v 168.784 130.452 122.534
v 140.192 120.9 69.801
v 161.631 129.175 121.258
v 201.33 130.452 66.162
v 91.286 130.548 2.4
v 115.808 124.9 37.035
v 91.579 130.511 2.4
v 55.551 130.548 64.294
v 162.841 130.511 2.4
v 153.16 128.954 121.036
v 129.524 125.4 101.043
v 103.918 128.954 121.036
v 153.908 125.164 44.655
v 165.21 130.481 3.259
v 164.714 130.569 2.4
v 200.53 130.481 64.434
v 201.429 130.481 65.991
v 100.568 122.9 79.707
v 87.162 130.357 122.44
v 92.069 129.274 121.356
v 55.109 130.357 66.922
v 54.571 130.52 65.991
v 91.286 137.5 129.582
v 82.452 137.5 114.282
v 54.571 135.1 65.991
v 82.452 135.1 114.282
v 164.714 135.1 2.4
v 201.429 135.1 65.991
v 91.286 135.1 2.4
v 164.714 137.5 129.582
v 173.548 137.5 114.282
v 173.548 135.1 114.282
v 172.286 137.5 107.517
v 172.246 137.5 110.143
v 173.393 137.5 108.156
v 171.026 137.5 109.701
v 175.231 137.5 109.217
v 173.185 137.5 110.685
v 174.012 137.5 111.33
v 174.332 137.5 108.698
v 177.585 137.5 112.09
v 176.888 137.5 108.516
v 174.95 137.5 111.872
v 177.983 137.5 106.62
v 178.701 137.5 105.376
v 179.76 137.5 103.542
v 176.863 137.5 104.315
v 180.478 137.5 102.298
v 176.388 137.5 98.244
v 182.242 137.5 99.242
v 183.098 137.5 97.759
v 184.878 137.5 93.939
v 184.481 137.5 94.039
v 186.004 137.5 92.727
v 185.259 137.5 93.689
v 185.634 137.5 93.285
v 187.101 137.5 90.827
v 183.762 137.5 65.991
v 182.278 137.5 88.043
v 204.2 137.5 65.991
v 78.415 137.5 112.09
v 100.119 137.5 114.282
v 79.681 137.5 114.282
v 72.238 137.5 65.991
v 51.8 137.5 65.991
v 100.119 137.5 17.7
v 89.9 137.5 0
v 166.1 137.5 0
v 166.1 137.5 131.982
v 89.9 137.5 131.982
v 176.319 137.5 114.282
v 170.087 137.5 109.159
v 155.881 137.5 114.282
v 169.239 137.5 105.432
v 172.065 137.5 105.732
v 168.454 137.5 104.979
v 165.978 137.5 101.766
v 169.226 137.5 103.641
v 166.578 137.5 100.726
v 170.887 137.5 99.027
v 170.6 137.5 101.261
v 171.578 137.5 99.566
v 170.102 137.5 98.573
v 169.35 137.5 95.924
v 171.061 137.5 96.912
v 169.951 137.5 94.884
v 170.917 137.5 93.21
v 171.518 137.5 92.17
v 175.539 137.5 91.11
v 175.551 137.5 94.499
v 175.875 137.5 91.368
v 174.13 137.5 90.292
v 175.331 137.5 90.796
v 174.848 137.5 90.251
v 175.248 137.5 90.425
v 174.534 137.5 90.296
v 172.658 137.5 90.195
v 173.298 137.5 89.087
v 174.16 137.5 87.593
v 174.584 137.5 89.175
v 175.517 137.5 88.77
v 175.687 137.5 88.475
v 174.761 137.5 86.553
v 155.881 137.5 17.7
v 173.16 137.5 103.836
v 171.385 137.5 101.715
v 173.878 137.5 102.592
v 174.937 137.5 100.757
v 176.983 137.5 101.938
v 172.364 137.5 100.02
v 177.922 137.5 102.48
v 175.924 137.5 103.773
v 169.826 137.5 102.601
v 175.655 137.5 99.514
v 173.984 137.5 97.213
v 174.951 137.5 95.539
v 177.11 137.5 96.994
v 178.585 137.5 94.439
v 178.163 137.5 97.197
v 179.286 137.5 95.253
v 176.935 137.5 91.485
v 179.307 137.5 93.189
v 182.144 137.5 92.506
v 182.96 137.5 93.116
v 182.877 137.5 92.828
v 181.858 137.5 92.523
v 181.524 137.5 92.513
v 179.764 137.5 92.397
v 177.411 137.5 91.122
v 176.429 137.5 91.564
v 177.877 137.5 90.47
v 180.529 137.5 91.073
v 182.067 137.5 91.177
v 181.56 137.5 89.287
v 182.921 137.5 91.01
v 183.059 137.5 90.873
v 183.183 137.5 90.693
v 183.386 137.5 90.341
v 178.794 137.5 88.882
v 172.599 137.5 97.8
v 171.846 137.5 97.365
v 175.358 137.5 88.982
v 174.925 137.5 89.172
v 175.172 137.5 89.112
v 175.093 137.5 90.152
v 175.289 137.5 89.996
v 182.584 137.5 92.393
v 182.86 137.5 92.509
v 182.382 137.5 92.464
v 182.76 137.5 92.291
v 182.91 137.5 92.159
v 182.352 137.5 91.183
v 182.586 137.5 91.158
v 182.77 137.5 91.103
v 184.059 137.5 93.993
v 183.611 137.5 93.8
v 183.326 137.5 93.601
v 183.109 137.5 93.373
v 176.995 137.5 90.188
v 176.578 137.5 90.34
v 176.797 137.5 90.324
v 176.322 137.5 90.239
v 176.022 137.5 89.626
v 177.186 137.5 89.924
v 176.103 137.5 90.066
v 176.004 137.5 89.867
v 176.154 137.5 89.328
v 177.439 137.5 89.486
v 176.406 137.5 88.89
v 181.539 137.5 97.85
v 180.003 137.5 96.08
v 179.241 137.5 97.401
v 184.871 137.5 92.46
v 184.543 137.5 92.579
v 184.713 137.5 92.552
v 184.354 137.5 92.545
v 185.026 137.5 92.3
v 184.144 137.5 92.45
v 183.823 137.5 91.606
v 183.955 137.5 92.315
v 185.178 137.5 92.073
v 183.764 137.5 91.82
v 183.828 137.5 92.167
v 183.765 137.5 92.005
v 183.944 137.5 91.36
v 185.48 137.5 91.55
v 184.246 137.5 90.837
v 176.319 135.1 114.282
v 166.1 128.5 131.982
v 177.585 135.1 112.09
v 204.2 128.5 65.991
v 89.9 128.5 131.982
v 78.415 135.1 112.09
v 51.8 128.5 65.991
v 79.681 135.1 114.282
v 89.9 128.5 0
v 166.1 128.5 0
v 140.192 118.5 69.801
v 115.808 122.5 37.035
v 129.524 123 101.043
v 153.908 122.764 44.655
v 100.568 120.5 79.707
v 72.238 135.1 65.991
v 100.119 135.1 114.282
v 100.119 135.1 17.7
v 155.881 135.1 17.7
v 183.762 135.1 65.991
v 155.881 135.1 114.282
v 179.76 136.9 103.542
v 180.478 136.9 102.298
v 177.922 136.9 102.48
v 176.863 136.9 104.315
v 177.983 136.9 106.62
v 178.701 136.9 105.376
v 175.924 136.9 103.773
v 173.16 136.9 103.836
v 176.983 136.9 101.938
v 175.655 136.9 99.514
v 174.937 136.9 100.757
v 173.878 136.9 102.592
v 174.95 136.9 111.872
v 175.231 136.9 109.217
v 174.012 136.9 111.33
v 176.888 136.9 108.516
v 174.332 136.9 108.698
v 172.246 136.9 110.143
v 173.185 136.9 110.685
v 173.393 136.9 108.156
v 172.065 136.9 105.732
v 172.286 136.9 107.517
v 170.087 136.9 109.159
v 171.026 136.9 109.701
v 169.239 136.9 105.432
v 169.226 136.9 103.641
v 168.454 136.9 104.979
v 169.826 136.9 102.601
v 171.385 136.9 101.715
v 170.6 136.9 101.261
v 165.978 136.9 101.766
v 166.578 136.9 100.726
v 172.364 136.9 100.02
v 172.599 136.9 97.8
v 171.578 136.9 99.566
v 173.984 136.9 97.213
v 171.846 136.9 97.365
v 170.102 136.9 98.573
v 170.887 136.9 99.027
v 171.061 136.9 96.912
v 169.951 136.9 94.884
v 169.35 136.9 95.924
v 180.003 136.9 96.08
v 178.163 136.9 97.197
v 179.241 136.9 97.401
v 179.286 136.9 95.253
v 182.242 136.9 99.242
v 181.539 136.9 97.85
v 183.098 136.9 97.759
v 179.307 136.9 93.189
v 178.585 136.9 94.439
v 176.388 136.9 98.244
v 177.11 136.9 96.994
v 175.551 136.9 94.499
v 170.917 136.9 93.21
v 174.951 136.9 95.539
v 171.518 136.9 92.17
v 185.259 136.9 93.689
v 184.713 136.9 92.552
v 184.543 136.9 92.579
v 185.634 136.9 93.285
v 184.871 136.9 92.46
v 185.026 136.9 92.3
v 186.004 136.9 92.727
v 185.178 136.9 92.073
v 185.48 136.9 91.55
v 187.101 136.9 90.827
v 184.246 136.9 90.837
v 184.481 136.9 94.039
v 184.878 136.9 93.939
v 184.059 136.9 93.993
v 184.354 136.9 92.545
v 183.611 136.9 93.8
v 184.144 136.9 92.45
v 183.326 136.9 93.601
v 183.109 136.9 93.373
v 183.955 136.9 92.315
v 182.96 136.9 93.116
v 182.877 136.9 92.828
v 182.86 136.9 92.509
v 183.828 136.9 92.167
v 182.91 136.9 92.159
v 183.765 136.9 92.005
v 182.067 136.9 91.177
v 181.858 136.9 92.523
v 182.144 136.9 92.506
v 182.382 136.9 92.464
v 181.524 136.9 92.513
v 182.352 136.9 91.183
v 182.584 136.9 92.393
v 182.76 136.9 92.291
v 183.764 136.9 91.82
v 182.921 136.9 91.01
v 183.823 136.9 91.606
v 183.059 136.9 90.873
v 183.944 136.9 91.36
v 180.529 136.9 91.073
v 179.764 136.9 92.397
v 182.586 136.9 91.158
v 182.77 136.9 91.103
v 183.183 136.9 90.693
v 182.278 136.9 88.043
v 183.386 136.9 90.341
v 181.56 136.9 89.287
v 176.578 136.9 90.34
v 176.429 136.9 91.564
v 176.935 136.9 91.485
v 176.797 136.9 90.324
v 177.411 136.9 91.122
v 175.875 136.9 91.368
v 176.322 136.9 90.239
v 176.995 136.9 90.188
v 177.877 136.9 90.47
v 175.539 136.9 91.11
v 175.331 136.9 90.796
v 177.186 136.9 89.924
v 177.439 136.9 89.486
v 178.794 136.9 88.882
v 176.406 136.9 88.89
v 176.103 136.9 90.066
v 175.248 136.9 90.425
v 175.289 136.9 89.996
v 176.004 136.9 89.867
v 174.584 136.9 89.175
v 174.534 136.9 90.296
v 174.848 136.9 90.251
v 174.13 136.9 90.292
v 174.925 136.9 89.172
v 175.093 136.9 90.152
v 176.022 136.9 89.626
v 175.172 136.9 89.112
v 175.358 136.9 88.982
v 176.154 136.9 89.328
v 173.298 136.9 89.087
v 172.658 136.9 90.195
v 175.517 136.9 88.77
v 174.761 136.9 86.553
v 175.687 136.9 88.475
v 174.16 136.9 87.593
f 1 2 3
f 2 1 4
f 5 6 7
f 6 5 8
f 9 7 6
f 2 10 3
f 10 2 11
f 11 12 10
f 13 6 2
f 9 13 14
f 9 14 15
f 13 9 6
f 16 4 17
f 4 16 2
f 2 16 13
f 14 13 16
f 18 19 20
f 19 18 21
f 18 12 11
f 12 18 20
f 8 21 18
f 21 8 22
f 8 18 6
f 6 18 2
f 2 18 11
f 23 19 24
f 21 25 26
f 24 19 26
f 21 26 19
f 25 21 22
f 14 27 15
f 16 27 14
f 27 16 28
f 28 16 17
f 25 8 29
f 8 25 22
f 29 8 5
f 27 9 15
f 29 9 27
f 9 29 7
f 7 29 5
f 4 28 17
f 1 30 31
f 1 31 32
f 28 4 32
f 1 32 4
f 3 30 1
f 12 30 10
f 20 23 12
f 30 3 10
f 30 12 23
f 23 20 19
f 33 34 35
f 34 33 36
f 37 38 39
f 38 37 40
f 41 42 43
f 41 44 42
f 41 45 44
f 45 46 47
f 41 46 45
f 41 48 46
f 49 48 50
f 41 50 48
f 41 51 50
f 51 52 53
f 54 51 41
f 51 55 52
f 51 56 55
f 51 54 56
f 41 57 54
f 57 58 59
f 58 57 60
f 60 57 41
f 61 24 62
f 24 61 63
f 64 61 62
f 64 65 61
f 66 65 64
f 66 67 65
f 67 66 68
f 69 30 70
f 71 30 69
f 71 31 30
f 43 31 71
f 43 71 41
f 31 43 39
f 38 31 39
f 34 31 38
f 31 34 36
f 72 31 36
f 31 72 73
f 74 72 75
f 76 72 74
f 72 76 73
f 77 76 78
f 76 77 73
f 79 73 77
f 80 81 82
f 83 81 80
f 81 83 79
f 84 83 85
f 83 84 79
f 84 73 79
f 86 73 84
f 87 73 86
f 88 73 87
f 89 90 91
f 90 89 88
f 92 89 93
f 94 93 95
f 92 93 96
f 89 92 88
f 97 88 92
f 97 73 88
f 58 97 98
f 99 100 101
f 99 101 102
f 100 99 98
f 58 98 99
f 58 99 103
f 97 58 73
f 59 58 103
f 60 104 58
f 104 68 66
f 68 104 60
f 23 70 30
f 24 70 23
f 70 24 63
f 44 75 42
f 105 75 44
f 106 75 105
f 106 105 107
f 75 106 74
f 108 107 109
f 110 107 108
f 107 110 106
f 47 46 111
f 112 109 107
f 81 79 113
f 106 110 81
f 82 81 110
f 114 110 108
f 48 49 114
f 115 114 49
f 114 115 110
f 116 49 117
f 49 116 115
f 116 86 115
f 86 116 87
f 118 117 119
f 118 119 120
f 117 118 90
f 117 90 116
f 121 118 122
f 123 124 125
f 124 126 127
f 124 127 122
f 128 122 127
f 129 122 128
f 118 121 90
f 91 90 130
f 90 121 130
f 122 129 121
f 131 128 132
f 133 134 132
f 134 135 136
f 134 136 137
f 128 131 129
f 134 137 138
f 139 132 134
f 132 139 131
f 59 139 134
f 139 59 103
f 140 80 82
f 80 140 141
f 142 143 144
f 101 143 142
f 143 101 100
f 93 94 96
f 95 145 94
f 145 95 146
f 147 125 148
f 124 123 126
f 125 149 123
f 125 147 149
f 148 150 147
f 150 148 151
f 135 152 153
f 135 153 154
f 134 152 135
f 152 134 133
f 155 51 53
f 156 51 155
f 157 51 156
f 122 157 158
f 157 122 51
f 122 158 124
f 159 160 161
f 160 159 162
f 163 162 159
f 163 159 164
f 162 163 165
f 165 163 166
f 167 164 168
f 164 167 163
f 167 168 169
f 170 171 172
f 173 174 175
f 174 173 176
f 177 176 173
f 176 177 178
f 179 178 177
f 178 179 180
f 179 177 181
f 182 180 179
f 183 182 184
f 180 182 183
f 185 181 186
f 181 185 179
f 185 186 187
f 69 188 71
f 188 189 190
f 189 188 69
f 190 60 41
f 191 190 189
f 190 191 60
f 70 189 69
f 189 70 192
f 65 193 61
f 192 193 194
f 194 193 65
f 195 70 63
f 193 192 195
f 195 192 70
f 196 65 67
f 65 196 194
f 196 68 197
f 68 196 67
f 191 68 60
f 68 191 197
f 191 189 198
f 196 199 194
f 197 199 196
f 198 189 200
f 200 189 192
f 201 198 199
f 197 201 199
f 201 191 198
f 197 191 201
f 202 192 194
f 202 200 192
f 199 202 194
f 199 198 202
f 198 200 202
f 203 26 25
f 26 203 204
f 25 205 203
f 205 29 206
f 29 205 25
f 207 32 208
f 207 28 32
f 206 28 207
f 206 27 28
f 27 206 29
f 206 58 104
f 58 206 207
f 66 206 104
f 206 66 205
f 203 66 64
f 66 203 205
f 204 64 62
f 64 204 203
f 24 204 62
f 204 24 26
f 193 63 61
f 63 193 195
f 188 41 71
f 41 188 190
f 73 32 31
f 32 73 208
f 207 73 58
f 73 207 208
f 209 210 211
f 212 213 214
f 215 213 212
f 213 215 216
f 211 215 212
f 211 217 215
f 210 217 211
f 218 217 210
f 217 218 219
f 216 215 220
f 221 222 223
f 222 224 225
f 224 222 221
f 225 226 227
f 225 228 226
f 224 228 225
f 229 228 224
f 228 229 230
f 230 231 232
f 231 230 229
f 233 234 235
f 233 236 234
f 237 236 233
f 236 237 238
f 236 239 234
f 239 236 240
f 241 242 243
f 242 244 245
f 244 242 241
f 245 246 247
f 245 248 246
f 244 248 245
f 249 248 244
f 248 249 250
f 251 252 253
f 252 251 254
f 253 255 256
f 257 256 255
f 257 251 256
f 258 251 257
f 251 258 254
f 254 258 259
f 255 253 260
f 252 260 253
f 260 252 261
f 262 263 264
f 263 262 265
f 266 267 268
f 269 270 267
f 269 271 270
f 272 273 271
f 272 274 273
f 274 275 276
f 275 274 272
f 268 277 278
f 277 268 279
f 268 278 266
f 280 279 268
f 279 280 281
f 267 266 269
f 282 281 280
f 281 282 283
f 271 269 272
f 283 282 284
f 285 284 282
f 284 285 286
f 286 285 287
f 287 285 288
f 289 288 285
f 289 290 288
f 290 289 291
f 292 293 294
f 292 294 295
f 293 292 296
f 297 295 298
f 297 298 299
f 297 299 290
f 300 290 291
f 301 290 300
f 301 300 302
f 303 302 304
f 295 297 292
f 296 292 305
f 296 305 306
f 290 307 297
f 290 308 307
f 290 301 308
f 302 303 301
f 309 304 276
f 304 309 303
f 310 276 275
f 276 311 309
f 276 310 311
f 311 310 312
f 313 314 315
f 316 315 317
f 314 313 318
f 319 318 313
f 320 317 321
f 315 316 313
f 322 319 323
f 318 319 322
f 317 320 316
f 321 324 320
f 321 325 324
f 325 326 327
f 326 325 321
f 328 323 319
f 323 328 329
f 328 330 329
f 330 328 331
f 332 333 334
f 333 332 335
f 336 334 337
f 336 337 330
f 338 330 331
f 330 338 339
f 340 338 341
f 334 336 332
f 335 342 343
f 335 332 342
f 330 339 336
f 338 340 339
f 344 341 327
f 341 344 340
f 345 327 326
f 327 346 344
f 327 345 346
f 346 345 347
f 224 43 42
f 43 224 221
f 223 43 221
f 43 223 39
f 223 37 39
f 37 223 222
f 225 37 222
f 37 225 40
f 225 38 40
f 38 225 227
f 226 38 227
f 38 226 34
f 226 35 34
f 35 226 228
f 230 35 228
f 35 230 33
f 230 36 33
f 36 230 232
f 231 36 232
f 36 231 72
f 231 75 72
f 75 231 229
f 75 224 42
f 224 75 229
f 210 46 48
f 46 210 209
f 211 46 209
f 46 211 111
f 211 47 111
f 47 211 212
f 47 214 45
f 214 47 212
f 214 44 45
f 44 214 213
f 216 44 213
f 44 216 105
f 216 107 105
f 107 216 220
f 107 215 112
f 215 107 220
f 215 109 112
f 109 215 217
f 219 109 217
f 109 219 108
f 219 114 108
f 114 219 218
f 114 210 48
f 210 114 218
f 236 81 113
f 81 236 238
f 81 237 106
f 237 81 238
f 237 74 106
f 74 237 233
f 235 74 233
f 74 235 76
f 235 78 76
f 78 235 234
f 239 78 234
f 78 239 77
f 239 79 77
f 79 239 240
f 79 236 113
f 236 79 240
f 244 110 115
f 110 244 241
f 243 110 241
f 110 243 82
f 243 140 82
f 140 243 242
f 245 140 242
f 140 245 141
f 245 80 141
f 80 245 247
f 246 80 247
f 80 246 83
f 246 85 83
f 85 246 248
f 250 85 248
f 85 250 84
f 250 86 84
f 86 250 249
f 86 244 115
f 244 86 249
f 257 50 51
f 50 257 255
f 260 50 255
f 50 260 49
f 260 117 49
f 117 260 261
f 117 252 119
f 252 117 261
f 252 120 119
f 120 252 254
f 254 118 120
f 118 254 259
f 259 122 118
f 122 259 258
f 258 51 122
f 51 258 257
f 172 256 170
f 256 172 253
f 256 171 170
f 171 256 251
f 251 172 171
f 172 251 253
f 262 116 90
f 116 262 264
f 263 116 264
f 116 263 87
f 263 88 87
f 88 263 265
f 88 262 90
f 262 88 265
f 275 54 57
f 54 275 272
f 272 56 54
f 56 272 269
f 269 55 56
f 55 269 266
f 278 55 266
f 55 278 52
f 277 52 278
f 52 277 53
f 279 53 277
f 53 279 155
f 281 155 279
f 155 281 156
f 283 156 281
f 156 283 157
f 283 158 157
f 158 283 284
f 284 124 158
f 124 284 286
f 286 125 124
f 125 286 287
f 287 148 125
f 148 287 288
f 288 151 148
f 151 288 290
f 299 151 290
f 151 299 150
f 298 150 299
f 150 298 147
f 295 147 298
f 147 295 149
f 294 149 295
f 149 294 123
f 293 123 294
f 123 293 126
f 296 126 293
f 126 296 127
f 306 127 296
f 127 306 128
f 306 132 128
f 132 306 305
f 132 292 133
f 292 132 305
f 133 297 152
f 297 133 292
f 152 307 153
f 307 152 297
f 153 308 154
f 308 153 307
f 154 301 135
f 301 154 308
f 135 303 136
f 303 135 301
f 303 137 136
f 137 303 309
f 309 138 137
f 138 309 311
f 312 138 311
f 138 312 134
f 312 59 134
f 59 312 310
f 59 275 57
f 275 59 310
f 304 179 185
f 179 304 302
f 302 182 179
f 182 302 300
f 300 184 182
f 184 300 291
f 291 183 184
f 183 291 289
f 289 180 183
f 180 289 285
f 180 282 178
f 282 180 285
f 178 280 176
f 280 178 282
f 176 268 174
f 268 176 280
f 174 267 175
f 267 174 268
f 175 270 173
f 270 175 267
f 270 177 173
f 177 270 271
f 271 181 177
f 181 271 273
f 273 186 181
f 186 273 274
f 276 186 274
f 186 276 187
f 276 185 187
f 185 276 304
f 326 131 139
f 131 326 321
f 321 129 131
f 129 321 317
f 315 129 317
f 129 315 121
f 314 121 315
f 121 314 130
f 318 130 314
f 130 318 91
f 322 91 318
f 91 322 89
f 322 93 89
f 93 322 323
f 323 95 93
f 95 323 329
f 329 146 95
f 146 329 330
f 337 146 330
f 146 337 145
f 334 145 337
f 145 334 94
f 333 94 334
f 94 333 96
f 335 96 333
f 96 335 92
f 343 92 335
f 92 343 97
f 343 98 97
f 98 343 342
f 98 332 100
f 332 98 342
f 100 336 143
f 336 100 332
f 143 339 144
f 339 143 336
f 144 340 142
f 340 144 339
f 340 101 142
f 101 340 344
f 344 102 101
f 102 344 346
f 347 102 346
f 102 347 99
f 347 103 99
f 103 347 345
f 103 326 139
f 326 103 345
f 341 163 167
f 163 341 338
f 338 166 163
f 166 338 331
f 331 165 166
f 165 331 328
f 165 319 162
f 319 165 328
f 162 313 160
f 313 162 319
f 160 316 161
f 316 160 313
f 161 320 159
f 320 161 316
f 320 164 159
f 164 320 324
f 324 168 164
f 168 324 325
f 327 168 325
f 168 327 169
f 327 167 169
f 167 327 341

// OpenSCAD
/* Faceted architectural hex tile — C02-T (RIFT): accepted C02 geometry plus a rear mark.
 * The ONLY change from C02 is a two-line debossed mark (RAHE / RIFT) on ONE upper
 * slanted tape-land segment (see [Rear mark]); set mark_enabled=false to get C02
 * exactly. mode="ab_pair" prints one marked and one unmarked tile for comparison.
 * Faceted architectural hex tile — candidate C02, NOT production released.
 * Standalone; OpenSCAD >= 2021.01. Units: mm.
 * Read ENGINEERING.md before printing or installing.
 * Local coordinates: XY = wall plane; rear tape plane Z=0; display +Z.
 * Upright output: local +Y becomes printer +Z; display faces printer -Y.
 * No temporary connections, supports, or adhesion geometry are in this CAD.
 */

/* [Output] */
mode = "trial_single"; // [trial_single,trial_pair,ab_pair,inspect,section]

/* [Product] */
corner_diameter = 152.4;
edge_depth = 9;
facet_rise = 10;

/* [Face pattern] */
// Relative rises of junctions A, B, C, D. Pattern XY is fixed and reproducible.
// A=upper-left interior, B=upper-center, C=right-center, D=lower-left interior.
// E=lower-right interior is derived to keep the broad right-hand face planar.
facet_profile = [0.80, 0.55, 1.00, 0.60];

/* [Shell] */
skin_axial = 2.4;       // Offset along local Z, NOT the facet-normal thickness.
perimeter_wall = 2.4;   // In-plane normal offset of the cavity hexagon.
roof_slope = 1;         // Local Z advance per local Y rise: 1 = 45 degrees.

/* [Mounting] */
land_width = 17.7;      // In-plane normal width; U-shaped, open at the top.
land_thickness = 2.4;
tape_width = 12.7;
tape_edge_allowance = 2.5; // Per side, for width placement tolerance.

/* [Manufacturing] */
pair_gap = 20;          // Minimum raw-model gap, along printer Y.
planned_brim = 8;       // Slicer allowance only; actual brim must be added there.
machine_margin = 5;    // In addition to brim, each XY side.
build_x = 256;         // Assumed machine envelope; replace with actual usable size.
build_y = 256;
build_z = 256;
z_clearance = 5;
nominal_line_width = 0.45;

/* [Validation limits] */
minimum_face_isolation = 1.6; // Conservative CLEAR AIR to underside of face skin.
minimum_skin_normal = 2;
minimum_cavity_radius = 20;
maximum_overhang_step_ratio = 1; // Horizontal layer advance / vertical layer rise.
nominal_size_tolerance = 1.524; // +/-1% of 152.4; resizing needs a new product review.

/* [Rear mark] */
// Two lines, debossed into ONE upper slanted segment of the rear tape land, near the
// open top, reading correctly from behind; line 1 sits toward the outer edge.
// The other upper segment carries no mark and stays fully available for tape.
// Owner, 28 Oct 2026: maker RAHE, model RIFT; no year.
// Owner chose layout B (28 Oct): maker first — RAHE 5.5 mm, RIFT 4.6 mm spaced wider, Futura Bold.
// Measured at these defaults (rendered geometry): lettering block 23.9 x 13.0 mm,
// 30.3–54.2 mm along the outer edge from the side corner; clear 2.36 / 2.35 mm to the
// outer / inner land edges and 2.56 mm to the open-top cut. Printability (2D, nozzle 0.4):
// thinnest stroke 0.96 mm, narrowest gap inside letters 0.98 mm, between letters 0.90 mm.
// Tape zone on the marked segment: 0–27.3 mm from the side corner (3 mm short of the
// text): use a 27 mm strip there. Unmarked upper segment: full 55.8 mm.
// Changing the words, size or position changes these numbers: re-measure.
mark_enabled = true;
mark_line1 = "RAHE";
mark_line2 = "RIFT";
mark_side = -1;           // -1: upper-left segment as seen from the back; 1: upper-right.
mark_size1 = 5.5;         // RAHE (maker), OpenSCAD text size, mm.
mark_size2 = 4.6;         // RIFT (model), smaller: maker first.
mark_line_pitch = 7.7;    // Centre-to-centre spacing of the two lines, across the land.
mark_across_shift = -0.24; // Re-centres the unequal lines across the land (+ = toward outer edge).
mark_depth = 0.6;         // Into the 2.4 mm land; leaves 1.8 mm.
mark_font = "Futura:style=Bold"; // macOS system font; on another machine check it is installed, or the geometry changes.
mark_spacing1 = 1.15;     // RAHE letter spacing.
mark_spacing2 = 1.35;     // RIFT letter spacing: wider, model-line style.
mark_center_t = 42.5;     // Mark centre, mm along the outer edge from the side corner.

/* [Hidden] */
eps = 0.02;
r = corner_diameter/2;
a = r*cos(30);
depth = edge_depth + facet_rise;
// Six boundary corners followed by five image-inspired interior junctions.
// All XY coordinates below are normalized to corner radius, not apothem.
pattern_xy = concat([for (i=[0:5]) [cos(60*i),sin(60*i)]],
                    [[-0.36,0.18],[0.02,0.46],[0.16,0.05],
                     [-0.16,-0.38],[0.34,-0.28]]);
right_normal = [cos(30),-sin(30)];
function dot2(u,v) = u[0]*v[0]+u[1]*v[1];
valid_profile = assert(len(facet_profile) == 4 && min(facet_profile) > 0 &&
                       max(facet_profile) == 1,
                       "Face profile needs four positive fractions, max exactly 1.")
                facet_profile;
e_fraction = valid_profile[2]*(cos(30)-dot2(right_normal,pattern_xy[10]))/
                             (cos(30)-dot2(right_normal,pattern_xy[8]));
pattern_heights = concat([0,0,0,0,0,0],valid_profile,[e_fraction]);
// Explicit CCW triangles in XY; two adjacent triangles intentionally form
// one coplanar broad right-hand facet. No runtime/random triangulation.
pattern_triangles = [[1,8,0],[4,9,3],[5,9,4],[1,7,8],[2,7,1],
                     [9,10,8],[5,10,9],[8,10,0],[10,5,0],
                     [6,2,3],[6,7,2],[9,6,3],[6,9,8],[7,6,8]];
function cross2(u,v) = u[0]*v[1]-u[1]*v[0];
function triangle_gradient(t) =
    let(u=(pattern_xy[t[1]]-pattern_xy[t[0]])*r,
        v=(pattern_xy[t[2]]-pattern_xy[t[0]])*r,
        du=(pattern_heights[t[1]]-pattern_heights[t[0]])*facet_rise,
        dv=(pattern_heights[t[2]]-pattern_heights[t[0]])*facet_rise,
        det=cross2(u,v))
    [(du*v[1]-dv*u[1])/det,(u[0]*dv-v[0]*du)/det];
facet_gradient = max([for (t=pattern_triangles) norm(triangle_gradient(t))]);
normal_factor = sqrt(1 + facet_gradient*facet_gradient);
skin_normal = skin_axial/normal_factor;
air_gap_bound = (edge_depth-skin_axial-land_thickness)/normal_factor;
cavity_r = (a-perimeter_wall)/cos(30);
open_r = (a-land_width)/cos(30);
count = mode == "trial_pair" || mode == "ab_pair" ? 2 : 1;
envelope_x = corner_diameter+2*(planned_brim+machine_margin);
envelope_y = count*depth+(count-1)*pair_gap+2*(planned_brim+machine_margin);
envelope_z = 2*a+z_clearance;

assert(mode == "trial_single" || mode == "trial_pair" || mode == "ab_pair" ||
       mode == "inspect" || mode == "section", "Unknown output mode.");
assert(abs(corner_diameter-152.4) <= nominal_size_tolerance &&
       nominal_size_tolerance >= 0 && nominal_size_tolerance <= 1.524,
       "Size must retain the 6-inch identity (+/-1% maximum).");
assert(edge_depth > 0 && facet_rise > 0 && depth <= 25,
       "Depth must be positive and <=25 mm for this candidate family.");
assert(e_fraction > 0 && e_fraction <= 1,
       "Derived E junction must remain in (0,1].");
assert(min([for(t=pattern_triangles)
            cross2(pattern_xy[t[1]]-pattern_xy[t[0]],
                   pattern_xy[t[2]]-pattern_xy[t[0]])]) > 0,
       "Face topology has a reversed or degenerate triangle.");
assert(skin_axial > 0 && minimum_skin_normal >= 2 &&
       skin_normal >= minimum_skin_normal, "Facet-normal skin is too thin.");
assert(nominal_line_width >= 0.25 && nominal_line_width <= 0.8 &&
       perimeter_wall >= 4*nominal_line_width &&
       land_thickness >= 4*nominal_line_width,
       "Perimeter and land need at least four nominal extrusion widths.");
assert(land_width > perimeter_wall && perimeter_wall >= skin_normal/2,
       "Invalid land / perimeter relationship.");
assert(minimum_face_isolation >= 1.6 && air_gap_bound >= minimum_face_isolation,
       "Rear land has insufficient conservative face-skin air isolation.");
assert(tape_width >= 12.7 && tape_edge_allowance >= 2 &&
       land_width >= tape_width+2*tape_edge_allowance,
       "Tape land cannot accommodate tape plus placement tolerance.");
assert(minimum_cavity_radius >= 20 && open_r >= minimum_cavity_radius &&
       cavity_r > open_r, "Cavity/land opening invalid or insufficiently hollow.");
assert(roof_slope > 0 && roof_slope <= maximum_overhang_step_ratio &&
       maximum_overhang_step_ratio > 0 && maximum_overhang_step_ratio <= 1 &&
       facet_gradient <= maximum_overhang_step_ratio,
       "Roof or facet exceeds the allowed geometric layer advance.");
assert(edge_depth/roof_slope + perimeter_wall < a-land_width,
       "Roof transition consumes too much of the upper cavity.");
assert(planned_brim >= 0 && machine_margin >= 0 && z_clearance >= 0 &&
       pair_gap >= 2*planned_brim+2,
       "Negative allowance, or pair brims overlap / have <2 mm clearance.");
assert(build_x > 0 && build_y > 0 && build_z > 0,
       "Build volume must be positive.");
if (mode == "trial_single" || mode == "trial_pair" || mode == "ab_pair") {
    assert(envelope_x <= build_x && envelope_y <= build_y &&
           envelope_z <= build_z, "Print layout plus allowances exceeds build volume.");
}

echo(candidate="C02", output=mode, readiness="UNRELEASED GEOMETRY CANDIDATE");
echo(product_dimensions=[corner_diameter,2*a,depth],
     skin_normal_mm=skin_normal, face_air_gap_lower_bound_mm=air_gap_bound,
     maximum_face_gradient=facet_gradient, junction_fractions=pattern_heights);
echo(raw_upright_dimensions=[corner_diameter,count*depth+(count-1)*pair_gap,2*a],
     allowed_print_envelope=[envelope_x,envelope_y,envelope_z]);

function hex_points(radius) = [for (i=[0:5]) [radius*cos(60*i),radius*sin(60*i)]];

// Closed piecewise-planar height field plus straight perimeter skirt.
// Interior heights are selected design values, not recovered image depths.
// The same entire topology is translated for the inner skin, including valleys.
module faceted_volume(bottom, face_offset=0) {
    n = len(pattern_xy);
    polyhedron(
        points=concat([for (i=[0:5]) [r*pattern_xy[i][0],r*pattern_xy[i][1],bottom]],
                      [for (i=[0:n-1]) [r*pattern_xy[i][0],r*pattern_xy[i][1],
                                        edge_depth+facet_rise*pattern_heights[i]-face_offset]]),
        faces=concat([[0,1,2,3,4,5]],
                     [for (i=[0:5]) [i,6+i,6+(i+1)%6,(i+1)%6]],
                     [for (t=pattern_triangles) [6+t[2],6+t[1],6+t[0]]]), convexity=10);
}

// Cavity limit: y + z/roof_slope <= a-perimeter_wall.
// As print height increases, roof grows continuously FROM the face toward rear.
// Reversing this plane would create a floating rear lip; keep this sign.
module below_roof() {
    multmatrix([[0,0,1,0],[1,0,0,0],[0,1,0,0],[0,0,0,1]])
        linear_extrude(height=4*r,center=true)
            polygon([[-2*r,-eps],
                     [a-perimeter_wall+eps/roof_slope,-eps],
                     [a-perimeter_wall-2*depth/roof_slope,2*depth],
                     [-2*r,2*depth]]);
}

module shell() {
    difference() {
        faceted_volume(0);
        intersection() {
            faceted_volume(-eps,skin_axial);
            translate([0,0,-eps])
                linear_extrude(height=depth+2*eps)
                    polygon(hex_points(cavity_r));
            below_roof();
        }
    }
}

// Integral rear land. No top crossbar: avoids a long bridge across the opening.
// Top cutoff only removes material as upright layers rise, creating no islands.
module tape_land() {
    linear_extrude(height=land_thickness)
        intersection() {
            difference() {
                polygon(hex_points(r));
                polygon(hex_points(open_r));
            }
            translate([-2*r,-2*r]) square([4*r,2*r+a-land_width]);
        }
}

// Rear mark, built in the back-view frame (u = -x, v = y) so it reads from behind,
// then mirrored into local coordinates. Each line runs along an upper slanted
// edge, centred across the land strip.
// side -1: back-view left (local x>0, edge from (-r,0) up to (-r/2,a)); +1: right.
// offset: across the land, positive toward the outer edge.
module mark_text(txt, side, offset, size, spacing) {
    p0 = [side*r, 0];
    dir = side < 0 ? [cos(60), sin(60)] : [-cos(60), sin(60)];
    inward = side < 0 ? [cos(-30), sin(-30)] : [-cos(-30), sin(-30)];
    c = p0 + mark_center_t*dir + (land_width/2-offset)*inward;
    ang = side < 0 ? 60 : -60;
    translate(c) rotate(ang)
        text(txt, size=size, font=mark_font, spacing=spacing,
             halign="center", valign="center");
}

assert(mark_depth > 0 && land_thickness-mark_depth >= 3*nominal_line_width,
       "Rear mark too deep: keep at least three extrusion widths of land behind it.");
assert(min(mark_size1,mark_size2) >= 4, "Rear mark under 4 mm will not print legibly upright.");

module rear_mark() {
    translate([0,0,-eps])
        linear_extrude(height=mark_depth+eps)
            mirror([1,0])
                union() {
                    mark_text(mark_line1, mark_side,  mark_line_pitch/2+mark_across_shift, mark_size1, mark_spacing1);
                    mark_text(mark_line2, mark_side, -mark_line_pitch/2+mark_across_shift, mark_size2, mark_spacing2);
                }
}

module tile(marked=mark_enabled) {
    difference() {
        union() { shell(); tape_land(); }
        if (marked) rear_mark();
    }
}

module upright(marked=mark_enabled) {
    translate([0,0,a]) rotate([90,0,0]) tile(marked);
}

// Trial layouts centered on the configured rectangular usable build surface.
// Brim/margins are reserved numerically; they are not exported as plastic.
module trial_layout() {
    for (i=[0:count-1])
        translate([build_x/2,
                   build_y/2-(count*depth+(count-1)*pair_gap)/2+depth+i*(depth+pair_gap),0])
            // ab_pair: first tile marked, second unmarked (same plate, same settings).
            upright(mode == "ab_pair" ? i == 0 : mark_enabled);
}

if (mode == "trial_single" || mode == "trial_pair" || mode == "ab_pair") trial_layout();
else if (mode == "inspect") tile();
else if (mode == "section")
    intersection() {
        tile();
        translate([0,-2*r,-eps]) cube([2*r,4*r,depth+2*eps]);
    }
